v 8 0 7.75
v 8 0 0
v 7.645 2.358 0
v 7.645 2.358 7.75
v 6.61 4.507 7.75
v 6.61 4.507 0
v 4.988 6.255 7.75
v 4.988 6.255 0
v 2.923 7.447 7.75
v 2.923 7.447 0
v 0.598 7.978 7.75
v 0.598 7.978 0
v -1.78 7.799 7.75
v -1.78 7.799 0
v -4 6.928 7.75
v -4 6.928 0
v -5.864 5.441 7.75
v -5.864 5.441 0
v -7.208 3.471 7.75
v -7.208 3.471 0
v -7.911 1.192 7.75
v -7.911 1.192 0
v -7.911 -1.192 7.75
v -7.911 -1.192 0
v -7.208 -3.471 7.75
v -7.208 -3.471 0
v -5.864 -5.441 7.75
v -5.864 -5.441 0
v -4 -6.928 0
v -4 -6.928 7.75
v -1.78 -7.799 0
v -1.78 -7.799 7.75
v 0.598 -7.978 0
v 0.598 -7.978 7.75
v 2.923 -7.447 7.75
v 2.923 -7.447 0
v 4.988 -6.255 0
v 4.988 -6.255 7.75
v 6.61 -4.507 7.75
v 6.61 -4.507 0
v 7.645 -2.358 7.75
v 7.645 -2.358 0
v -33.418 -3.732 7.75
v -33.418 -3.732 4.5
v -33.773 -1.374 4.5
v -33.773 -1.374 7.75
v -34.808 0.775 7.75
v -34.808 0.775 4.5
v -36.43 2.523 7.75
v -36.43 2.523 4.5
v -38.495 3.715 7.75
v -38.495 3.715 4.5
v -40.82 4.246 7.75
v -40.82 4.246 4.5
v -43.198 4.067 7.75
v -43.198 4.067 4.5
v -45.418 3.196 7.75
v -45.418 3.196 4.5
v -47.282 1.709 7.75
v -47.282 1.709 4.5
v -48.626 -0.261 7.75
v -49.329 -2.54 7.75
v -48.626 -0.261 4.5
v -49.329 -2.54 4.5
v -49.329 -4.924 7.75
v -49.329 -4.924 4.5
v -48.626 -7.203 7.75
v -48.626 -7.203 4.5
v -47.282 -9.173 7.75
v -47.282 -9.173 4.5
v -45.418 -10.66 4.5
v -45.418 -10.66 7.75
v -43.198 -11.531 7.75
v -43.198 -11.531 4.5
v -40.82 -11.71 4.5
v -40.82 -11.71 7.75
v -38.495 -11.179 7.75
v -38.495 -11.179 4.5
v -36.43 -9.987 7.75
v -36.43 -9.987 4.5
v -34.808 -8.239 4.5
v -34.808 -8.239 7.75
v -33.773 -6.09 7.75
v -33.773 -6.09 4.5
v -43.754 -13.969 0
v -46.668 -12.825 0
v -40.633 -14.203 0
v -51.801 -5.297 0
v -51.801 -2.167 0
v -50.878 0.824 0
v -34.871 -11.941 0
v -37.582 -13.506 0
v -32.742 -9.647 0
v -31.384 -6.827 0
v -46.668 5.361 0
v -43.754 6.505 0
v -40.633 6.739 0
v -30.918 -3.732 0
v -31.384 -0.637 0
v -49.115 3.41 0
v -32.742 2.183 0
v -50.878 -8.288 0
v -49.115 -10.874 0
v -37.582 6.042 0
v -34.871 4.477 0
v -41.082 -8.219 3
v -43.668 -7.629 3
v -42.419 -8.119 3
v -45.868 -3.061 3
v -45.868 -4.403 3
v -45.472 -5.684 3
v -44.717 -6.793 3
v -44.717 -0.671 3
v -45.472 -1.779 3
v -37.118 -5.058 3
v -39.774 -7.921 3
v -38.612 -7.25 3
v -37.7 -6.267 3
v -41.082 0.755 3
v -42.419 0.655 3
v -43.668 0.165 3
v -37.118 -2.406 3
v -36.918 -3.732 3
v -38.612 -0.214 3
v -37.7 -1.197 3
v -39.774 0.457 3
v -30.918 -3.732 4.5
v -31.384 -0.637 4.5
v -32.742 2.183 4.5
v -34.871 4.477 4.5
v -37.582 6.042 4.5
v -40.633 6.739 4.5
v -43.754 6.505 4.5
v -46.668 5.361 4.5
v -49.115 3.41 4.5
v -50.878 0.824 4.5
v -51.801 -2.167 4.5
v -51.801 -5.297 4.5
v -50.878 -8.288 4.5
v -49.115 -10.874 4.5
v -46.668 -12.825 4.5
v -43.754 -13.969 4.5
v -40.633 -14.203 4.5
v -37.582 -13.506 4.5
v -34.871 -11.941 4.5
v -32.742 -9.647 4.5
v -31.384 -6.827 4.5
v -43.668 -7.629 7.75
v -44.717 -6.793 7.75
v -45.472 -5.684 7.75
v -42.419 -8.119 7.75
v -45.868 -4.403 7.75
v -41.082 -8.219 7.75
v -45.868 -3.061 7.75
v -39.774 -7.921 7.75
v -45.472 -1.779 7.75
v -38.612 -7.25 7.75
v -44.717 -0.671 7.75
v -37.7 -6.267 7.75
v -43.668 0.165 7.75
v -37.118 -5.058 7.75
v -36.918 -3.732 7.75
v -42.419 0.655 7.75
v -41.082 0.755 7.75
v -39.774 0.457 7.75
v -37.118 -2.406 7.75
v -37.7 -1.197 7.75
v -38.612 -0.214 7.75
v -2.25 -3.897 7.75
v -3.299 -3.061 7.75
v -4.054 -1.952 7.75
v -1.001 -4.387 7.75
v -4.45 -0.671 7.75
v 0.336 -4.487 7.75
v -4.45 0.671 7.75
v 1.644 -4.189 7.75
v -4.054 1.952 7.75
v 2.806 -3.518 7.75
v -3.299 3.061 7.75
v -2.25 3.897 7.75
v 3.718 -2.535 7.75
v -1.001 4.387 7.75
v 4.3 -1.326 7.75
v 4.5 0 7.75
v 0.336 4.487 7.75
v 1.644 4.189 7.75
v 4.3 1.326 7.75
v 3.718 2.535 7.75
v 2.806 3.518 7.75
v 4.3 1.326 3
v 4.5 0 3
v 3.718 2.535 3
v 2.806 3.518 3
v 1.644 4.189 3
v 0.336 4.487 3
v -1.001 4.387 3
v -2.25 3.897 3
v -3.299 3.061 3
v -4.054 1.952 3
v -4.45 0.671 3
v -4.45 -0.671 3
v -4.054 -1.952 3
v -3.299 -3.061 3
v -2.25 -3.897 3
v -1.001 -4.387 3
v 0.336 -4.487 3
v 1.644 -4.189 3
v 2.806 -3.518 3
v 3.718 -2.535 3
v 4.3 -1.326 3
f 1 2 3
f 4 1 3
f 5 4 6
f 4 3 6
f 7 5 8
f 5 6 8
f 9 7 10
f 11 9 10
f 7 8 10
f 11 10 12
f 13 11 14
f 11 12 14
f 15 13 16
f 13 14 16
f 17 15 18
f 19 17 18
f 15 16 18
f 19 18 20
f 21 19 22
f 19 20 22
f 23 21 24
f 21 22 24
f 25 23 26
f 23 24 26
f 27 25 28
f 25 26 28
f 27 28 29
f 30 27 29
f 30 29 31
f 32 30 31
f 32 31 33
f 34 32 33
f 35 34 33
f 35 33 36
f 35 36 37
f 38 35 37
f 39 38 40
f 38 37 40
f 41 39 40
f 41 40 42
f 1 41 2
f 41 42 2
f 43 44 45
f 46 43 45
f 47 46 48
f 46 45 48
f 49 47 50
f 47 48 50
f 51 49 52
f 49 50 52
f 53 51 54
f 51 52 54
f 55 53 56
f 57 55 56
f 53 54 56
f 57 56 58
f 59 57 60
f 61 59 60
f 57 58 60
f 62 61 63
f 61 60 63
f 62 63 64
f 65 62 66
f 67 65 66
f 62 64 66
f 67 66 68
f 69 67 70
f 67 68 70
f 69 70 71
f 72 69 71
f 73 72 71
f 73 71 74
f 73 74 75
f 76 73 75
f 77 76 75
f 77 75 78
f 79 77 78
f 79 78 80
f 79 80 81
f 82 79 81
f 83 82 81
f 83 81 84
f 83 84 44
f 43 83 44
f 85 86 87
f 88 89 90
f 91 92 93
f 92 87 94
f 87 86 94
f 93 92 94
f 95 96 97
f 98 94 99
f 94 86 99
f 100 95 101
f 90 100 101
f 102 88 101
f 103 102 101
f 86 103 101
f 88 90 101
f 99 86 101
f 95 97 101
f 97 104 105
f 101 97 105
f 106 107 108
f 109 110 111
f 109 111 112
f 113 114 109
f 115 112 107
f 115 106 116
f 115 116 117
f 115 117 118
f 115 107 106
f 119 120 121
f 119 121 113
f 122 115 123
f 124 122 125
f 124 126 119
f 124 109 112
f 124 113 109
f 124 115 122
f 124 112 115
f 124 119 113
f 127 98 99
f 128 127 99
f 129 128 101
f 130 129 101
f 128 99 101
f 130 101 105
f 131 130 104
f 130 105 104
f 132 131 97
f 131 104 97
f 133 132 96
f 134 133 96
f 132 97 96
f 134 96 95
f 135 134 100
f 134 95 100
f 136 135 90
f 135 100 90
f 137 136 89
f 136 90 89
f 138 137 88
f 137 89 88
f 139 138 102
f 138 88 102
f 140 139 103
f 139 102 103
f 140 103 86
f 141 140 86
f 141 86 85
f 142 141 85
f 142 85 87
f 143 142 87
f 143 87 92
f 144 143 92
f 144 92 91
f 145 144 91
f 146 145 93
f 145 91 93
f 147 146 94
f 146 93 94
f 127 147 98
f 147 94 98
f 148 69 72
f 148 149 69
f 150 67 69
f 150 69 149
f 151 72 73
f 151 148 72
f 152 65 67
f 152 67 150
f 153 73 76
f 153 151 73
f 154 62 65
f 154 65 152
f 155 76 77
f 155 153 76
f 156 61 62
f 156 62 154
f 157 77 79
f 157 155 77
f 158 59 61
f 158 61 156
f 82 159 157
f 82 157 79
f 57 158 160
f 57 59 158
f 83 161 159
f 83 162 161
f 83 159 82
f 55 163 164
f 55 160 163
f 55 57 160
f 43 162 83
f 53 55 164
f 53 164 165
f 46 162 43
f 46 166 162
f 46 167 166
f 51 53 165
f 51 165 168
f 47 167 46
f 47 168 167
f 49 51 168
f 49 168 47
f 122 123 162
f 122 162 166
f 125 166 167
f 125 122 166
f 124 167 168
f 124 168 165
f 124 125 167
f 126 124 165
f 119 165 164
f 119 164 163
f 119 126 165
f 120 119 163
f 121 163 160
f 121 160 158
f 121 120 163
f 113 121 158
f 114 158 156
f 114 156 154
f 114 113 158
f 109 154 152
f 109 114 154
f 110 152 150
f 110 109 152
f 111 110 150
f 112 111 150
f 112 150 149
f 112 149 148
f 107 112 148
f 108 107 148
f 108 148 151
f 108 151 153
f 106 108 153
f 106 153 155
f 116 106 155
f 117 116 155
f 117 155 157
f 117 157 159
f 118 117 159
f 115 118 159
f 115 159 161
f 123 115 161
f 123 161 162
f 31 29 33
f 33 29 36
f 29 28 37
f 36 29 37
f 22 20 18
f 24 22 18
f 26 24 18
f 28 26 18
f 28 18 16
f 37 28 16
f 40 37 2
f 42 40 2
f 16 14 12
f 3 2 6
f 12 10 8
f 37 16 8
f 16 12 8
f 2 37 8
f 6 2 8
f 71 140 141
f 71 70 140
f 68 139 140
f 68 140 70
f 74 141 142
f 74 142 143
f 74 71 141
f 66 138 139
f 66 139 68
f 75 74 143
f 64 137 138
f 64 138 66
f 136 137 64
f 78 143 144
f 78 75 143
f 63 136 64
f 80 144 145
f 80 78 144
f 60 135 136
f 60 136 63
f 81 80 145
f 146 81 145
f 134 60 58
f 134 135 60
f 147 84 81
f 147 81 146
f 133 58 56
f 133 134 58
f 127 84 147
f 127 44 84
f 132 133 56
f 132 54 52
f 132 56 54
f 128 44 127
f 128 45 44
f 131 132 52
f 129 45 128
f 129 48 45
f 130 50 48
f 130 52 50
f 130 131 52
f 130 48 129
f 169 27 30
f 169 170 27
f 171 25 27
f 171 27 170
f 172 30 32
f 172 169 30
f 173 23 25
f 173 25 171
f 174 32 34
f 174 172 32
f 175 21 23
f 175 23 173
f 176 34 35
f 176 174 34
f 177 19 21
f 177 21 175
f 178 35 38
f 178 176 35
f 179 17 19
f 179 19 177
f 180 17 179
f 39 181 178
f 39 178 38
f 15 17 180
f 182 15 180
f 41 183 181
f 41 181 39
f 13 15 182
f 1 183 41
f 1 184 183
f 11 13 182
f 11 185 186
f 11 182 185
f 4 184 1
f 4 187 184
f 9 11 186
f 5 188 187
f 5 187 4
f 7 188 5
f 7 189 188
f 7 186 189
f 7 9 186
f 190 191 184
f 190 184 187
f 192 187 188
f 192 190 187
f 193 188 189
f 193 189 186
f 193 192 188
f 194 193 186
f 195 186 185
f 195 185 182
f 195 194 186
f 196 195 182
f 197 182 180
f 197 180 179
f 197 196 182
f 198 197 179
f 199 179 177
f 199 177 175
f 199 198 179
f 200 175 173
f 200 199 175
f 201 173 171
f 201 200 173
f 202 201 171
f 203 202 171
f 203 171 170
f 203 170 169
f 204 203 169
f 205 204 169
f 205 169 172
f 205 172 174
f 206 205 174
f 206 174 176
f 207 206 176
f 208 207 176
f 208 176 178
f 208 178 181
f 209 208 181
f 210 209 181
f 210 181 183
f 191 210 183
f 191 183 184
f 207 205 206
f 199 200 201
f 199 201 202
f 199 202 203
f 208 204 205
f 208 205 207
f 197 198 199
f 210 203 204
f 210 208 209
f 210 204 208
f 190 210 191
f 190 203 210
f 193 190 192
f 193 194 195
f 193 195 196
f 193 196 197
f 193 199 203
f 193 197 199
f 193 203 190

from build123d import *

# Parameters (mm, degrees)
F0_R     = 8
F0_R_2   = 4.5
F1_DEPTH = 7.75
F2_DEPTH = 3
F0_R_3   = 10.5
F3_DEPTH = 4.5


with BuildPart() as f1:
    # F0 (on Top) → F1 (new body)
    with BuildSketch(Plane.XY):
        Circle(F0_R)
        Circle(F0_R_2, mode=Mode.SUBTRACT)
        with Locations((-41.417908, -3.73194)):
            Circle(F0_R)
        with Locations((-41.417908, -3.73194)):
            Circle(F0_R_2, mode=Mode.SUBTRACT)
    extrude(amount=F1_DEPTH)

    # F0 (on Top) → F2 (join)
    with BuildSketch(Plane.XY):
        Circle(F0_R_2)
        with Locations((-41.417908, -3.73194)):
            Circle(F0_R_2)
    extrude(amount=F2_DEPTH)

    # F0 (on Top) → F3 (join)
    with BuildSketch(Plane.XY):
        with Locations((-41.417908, -3.73194)):
            Circle(F0_R_3)
        with Locations((-41.417908, -3.73194)):
            Circle(F0_R, mode=Mode.SUBTRACT)
    extrude(amount=F3_DEPTH)


solid = f1.part
